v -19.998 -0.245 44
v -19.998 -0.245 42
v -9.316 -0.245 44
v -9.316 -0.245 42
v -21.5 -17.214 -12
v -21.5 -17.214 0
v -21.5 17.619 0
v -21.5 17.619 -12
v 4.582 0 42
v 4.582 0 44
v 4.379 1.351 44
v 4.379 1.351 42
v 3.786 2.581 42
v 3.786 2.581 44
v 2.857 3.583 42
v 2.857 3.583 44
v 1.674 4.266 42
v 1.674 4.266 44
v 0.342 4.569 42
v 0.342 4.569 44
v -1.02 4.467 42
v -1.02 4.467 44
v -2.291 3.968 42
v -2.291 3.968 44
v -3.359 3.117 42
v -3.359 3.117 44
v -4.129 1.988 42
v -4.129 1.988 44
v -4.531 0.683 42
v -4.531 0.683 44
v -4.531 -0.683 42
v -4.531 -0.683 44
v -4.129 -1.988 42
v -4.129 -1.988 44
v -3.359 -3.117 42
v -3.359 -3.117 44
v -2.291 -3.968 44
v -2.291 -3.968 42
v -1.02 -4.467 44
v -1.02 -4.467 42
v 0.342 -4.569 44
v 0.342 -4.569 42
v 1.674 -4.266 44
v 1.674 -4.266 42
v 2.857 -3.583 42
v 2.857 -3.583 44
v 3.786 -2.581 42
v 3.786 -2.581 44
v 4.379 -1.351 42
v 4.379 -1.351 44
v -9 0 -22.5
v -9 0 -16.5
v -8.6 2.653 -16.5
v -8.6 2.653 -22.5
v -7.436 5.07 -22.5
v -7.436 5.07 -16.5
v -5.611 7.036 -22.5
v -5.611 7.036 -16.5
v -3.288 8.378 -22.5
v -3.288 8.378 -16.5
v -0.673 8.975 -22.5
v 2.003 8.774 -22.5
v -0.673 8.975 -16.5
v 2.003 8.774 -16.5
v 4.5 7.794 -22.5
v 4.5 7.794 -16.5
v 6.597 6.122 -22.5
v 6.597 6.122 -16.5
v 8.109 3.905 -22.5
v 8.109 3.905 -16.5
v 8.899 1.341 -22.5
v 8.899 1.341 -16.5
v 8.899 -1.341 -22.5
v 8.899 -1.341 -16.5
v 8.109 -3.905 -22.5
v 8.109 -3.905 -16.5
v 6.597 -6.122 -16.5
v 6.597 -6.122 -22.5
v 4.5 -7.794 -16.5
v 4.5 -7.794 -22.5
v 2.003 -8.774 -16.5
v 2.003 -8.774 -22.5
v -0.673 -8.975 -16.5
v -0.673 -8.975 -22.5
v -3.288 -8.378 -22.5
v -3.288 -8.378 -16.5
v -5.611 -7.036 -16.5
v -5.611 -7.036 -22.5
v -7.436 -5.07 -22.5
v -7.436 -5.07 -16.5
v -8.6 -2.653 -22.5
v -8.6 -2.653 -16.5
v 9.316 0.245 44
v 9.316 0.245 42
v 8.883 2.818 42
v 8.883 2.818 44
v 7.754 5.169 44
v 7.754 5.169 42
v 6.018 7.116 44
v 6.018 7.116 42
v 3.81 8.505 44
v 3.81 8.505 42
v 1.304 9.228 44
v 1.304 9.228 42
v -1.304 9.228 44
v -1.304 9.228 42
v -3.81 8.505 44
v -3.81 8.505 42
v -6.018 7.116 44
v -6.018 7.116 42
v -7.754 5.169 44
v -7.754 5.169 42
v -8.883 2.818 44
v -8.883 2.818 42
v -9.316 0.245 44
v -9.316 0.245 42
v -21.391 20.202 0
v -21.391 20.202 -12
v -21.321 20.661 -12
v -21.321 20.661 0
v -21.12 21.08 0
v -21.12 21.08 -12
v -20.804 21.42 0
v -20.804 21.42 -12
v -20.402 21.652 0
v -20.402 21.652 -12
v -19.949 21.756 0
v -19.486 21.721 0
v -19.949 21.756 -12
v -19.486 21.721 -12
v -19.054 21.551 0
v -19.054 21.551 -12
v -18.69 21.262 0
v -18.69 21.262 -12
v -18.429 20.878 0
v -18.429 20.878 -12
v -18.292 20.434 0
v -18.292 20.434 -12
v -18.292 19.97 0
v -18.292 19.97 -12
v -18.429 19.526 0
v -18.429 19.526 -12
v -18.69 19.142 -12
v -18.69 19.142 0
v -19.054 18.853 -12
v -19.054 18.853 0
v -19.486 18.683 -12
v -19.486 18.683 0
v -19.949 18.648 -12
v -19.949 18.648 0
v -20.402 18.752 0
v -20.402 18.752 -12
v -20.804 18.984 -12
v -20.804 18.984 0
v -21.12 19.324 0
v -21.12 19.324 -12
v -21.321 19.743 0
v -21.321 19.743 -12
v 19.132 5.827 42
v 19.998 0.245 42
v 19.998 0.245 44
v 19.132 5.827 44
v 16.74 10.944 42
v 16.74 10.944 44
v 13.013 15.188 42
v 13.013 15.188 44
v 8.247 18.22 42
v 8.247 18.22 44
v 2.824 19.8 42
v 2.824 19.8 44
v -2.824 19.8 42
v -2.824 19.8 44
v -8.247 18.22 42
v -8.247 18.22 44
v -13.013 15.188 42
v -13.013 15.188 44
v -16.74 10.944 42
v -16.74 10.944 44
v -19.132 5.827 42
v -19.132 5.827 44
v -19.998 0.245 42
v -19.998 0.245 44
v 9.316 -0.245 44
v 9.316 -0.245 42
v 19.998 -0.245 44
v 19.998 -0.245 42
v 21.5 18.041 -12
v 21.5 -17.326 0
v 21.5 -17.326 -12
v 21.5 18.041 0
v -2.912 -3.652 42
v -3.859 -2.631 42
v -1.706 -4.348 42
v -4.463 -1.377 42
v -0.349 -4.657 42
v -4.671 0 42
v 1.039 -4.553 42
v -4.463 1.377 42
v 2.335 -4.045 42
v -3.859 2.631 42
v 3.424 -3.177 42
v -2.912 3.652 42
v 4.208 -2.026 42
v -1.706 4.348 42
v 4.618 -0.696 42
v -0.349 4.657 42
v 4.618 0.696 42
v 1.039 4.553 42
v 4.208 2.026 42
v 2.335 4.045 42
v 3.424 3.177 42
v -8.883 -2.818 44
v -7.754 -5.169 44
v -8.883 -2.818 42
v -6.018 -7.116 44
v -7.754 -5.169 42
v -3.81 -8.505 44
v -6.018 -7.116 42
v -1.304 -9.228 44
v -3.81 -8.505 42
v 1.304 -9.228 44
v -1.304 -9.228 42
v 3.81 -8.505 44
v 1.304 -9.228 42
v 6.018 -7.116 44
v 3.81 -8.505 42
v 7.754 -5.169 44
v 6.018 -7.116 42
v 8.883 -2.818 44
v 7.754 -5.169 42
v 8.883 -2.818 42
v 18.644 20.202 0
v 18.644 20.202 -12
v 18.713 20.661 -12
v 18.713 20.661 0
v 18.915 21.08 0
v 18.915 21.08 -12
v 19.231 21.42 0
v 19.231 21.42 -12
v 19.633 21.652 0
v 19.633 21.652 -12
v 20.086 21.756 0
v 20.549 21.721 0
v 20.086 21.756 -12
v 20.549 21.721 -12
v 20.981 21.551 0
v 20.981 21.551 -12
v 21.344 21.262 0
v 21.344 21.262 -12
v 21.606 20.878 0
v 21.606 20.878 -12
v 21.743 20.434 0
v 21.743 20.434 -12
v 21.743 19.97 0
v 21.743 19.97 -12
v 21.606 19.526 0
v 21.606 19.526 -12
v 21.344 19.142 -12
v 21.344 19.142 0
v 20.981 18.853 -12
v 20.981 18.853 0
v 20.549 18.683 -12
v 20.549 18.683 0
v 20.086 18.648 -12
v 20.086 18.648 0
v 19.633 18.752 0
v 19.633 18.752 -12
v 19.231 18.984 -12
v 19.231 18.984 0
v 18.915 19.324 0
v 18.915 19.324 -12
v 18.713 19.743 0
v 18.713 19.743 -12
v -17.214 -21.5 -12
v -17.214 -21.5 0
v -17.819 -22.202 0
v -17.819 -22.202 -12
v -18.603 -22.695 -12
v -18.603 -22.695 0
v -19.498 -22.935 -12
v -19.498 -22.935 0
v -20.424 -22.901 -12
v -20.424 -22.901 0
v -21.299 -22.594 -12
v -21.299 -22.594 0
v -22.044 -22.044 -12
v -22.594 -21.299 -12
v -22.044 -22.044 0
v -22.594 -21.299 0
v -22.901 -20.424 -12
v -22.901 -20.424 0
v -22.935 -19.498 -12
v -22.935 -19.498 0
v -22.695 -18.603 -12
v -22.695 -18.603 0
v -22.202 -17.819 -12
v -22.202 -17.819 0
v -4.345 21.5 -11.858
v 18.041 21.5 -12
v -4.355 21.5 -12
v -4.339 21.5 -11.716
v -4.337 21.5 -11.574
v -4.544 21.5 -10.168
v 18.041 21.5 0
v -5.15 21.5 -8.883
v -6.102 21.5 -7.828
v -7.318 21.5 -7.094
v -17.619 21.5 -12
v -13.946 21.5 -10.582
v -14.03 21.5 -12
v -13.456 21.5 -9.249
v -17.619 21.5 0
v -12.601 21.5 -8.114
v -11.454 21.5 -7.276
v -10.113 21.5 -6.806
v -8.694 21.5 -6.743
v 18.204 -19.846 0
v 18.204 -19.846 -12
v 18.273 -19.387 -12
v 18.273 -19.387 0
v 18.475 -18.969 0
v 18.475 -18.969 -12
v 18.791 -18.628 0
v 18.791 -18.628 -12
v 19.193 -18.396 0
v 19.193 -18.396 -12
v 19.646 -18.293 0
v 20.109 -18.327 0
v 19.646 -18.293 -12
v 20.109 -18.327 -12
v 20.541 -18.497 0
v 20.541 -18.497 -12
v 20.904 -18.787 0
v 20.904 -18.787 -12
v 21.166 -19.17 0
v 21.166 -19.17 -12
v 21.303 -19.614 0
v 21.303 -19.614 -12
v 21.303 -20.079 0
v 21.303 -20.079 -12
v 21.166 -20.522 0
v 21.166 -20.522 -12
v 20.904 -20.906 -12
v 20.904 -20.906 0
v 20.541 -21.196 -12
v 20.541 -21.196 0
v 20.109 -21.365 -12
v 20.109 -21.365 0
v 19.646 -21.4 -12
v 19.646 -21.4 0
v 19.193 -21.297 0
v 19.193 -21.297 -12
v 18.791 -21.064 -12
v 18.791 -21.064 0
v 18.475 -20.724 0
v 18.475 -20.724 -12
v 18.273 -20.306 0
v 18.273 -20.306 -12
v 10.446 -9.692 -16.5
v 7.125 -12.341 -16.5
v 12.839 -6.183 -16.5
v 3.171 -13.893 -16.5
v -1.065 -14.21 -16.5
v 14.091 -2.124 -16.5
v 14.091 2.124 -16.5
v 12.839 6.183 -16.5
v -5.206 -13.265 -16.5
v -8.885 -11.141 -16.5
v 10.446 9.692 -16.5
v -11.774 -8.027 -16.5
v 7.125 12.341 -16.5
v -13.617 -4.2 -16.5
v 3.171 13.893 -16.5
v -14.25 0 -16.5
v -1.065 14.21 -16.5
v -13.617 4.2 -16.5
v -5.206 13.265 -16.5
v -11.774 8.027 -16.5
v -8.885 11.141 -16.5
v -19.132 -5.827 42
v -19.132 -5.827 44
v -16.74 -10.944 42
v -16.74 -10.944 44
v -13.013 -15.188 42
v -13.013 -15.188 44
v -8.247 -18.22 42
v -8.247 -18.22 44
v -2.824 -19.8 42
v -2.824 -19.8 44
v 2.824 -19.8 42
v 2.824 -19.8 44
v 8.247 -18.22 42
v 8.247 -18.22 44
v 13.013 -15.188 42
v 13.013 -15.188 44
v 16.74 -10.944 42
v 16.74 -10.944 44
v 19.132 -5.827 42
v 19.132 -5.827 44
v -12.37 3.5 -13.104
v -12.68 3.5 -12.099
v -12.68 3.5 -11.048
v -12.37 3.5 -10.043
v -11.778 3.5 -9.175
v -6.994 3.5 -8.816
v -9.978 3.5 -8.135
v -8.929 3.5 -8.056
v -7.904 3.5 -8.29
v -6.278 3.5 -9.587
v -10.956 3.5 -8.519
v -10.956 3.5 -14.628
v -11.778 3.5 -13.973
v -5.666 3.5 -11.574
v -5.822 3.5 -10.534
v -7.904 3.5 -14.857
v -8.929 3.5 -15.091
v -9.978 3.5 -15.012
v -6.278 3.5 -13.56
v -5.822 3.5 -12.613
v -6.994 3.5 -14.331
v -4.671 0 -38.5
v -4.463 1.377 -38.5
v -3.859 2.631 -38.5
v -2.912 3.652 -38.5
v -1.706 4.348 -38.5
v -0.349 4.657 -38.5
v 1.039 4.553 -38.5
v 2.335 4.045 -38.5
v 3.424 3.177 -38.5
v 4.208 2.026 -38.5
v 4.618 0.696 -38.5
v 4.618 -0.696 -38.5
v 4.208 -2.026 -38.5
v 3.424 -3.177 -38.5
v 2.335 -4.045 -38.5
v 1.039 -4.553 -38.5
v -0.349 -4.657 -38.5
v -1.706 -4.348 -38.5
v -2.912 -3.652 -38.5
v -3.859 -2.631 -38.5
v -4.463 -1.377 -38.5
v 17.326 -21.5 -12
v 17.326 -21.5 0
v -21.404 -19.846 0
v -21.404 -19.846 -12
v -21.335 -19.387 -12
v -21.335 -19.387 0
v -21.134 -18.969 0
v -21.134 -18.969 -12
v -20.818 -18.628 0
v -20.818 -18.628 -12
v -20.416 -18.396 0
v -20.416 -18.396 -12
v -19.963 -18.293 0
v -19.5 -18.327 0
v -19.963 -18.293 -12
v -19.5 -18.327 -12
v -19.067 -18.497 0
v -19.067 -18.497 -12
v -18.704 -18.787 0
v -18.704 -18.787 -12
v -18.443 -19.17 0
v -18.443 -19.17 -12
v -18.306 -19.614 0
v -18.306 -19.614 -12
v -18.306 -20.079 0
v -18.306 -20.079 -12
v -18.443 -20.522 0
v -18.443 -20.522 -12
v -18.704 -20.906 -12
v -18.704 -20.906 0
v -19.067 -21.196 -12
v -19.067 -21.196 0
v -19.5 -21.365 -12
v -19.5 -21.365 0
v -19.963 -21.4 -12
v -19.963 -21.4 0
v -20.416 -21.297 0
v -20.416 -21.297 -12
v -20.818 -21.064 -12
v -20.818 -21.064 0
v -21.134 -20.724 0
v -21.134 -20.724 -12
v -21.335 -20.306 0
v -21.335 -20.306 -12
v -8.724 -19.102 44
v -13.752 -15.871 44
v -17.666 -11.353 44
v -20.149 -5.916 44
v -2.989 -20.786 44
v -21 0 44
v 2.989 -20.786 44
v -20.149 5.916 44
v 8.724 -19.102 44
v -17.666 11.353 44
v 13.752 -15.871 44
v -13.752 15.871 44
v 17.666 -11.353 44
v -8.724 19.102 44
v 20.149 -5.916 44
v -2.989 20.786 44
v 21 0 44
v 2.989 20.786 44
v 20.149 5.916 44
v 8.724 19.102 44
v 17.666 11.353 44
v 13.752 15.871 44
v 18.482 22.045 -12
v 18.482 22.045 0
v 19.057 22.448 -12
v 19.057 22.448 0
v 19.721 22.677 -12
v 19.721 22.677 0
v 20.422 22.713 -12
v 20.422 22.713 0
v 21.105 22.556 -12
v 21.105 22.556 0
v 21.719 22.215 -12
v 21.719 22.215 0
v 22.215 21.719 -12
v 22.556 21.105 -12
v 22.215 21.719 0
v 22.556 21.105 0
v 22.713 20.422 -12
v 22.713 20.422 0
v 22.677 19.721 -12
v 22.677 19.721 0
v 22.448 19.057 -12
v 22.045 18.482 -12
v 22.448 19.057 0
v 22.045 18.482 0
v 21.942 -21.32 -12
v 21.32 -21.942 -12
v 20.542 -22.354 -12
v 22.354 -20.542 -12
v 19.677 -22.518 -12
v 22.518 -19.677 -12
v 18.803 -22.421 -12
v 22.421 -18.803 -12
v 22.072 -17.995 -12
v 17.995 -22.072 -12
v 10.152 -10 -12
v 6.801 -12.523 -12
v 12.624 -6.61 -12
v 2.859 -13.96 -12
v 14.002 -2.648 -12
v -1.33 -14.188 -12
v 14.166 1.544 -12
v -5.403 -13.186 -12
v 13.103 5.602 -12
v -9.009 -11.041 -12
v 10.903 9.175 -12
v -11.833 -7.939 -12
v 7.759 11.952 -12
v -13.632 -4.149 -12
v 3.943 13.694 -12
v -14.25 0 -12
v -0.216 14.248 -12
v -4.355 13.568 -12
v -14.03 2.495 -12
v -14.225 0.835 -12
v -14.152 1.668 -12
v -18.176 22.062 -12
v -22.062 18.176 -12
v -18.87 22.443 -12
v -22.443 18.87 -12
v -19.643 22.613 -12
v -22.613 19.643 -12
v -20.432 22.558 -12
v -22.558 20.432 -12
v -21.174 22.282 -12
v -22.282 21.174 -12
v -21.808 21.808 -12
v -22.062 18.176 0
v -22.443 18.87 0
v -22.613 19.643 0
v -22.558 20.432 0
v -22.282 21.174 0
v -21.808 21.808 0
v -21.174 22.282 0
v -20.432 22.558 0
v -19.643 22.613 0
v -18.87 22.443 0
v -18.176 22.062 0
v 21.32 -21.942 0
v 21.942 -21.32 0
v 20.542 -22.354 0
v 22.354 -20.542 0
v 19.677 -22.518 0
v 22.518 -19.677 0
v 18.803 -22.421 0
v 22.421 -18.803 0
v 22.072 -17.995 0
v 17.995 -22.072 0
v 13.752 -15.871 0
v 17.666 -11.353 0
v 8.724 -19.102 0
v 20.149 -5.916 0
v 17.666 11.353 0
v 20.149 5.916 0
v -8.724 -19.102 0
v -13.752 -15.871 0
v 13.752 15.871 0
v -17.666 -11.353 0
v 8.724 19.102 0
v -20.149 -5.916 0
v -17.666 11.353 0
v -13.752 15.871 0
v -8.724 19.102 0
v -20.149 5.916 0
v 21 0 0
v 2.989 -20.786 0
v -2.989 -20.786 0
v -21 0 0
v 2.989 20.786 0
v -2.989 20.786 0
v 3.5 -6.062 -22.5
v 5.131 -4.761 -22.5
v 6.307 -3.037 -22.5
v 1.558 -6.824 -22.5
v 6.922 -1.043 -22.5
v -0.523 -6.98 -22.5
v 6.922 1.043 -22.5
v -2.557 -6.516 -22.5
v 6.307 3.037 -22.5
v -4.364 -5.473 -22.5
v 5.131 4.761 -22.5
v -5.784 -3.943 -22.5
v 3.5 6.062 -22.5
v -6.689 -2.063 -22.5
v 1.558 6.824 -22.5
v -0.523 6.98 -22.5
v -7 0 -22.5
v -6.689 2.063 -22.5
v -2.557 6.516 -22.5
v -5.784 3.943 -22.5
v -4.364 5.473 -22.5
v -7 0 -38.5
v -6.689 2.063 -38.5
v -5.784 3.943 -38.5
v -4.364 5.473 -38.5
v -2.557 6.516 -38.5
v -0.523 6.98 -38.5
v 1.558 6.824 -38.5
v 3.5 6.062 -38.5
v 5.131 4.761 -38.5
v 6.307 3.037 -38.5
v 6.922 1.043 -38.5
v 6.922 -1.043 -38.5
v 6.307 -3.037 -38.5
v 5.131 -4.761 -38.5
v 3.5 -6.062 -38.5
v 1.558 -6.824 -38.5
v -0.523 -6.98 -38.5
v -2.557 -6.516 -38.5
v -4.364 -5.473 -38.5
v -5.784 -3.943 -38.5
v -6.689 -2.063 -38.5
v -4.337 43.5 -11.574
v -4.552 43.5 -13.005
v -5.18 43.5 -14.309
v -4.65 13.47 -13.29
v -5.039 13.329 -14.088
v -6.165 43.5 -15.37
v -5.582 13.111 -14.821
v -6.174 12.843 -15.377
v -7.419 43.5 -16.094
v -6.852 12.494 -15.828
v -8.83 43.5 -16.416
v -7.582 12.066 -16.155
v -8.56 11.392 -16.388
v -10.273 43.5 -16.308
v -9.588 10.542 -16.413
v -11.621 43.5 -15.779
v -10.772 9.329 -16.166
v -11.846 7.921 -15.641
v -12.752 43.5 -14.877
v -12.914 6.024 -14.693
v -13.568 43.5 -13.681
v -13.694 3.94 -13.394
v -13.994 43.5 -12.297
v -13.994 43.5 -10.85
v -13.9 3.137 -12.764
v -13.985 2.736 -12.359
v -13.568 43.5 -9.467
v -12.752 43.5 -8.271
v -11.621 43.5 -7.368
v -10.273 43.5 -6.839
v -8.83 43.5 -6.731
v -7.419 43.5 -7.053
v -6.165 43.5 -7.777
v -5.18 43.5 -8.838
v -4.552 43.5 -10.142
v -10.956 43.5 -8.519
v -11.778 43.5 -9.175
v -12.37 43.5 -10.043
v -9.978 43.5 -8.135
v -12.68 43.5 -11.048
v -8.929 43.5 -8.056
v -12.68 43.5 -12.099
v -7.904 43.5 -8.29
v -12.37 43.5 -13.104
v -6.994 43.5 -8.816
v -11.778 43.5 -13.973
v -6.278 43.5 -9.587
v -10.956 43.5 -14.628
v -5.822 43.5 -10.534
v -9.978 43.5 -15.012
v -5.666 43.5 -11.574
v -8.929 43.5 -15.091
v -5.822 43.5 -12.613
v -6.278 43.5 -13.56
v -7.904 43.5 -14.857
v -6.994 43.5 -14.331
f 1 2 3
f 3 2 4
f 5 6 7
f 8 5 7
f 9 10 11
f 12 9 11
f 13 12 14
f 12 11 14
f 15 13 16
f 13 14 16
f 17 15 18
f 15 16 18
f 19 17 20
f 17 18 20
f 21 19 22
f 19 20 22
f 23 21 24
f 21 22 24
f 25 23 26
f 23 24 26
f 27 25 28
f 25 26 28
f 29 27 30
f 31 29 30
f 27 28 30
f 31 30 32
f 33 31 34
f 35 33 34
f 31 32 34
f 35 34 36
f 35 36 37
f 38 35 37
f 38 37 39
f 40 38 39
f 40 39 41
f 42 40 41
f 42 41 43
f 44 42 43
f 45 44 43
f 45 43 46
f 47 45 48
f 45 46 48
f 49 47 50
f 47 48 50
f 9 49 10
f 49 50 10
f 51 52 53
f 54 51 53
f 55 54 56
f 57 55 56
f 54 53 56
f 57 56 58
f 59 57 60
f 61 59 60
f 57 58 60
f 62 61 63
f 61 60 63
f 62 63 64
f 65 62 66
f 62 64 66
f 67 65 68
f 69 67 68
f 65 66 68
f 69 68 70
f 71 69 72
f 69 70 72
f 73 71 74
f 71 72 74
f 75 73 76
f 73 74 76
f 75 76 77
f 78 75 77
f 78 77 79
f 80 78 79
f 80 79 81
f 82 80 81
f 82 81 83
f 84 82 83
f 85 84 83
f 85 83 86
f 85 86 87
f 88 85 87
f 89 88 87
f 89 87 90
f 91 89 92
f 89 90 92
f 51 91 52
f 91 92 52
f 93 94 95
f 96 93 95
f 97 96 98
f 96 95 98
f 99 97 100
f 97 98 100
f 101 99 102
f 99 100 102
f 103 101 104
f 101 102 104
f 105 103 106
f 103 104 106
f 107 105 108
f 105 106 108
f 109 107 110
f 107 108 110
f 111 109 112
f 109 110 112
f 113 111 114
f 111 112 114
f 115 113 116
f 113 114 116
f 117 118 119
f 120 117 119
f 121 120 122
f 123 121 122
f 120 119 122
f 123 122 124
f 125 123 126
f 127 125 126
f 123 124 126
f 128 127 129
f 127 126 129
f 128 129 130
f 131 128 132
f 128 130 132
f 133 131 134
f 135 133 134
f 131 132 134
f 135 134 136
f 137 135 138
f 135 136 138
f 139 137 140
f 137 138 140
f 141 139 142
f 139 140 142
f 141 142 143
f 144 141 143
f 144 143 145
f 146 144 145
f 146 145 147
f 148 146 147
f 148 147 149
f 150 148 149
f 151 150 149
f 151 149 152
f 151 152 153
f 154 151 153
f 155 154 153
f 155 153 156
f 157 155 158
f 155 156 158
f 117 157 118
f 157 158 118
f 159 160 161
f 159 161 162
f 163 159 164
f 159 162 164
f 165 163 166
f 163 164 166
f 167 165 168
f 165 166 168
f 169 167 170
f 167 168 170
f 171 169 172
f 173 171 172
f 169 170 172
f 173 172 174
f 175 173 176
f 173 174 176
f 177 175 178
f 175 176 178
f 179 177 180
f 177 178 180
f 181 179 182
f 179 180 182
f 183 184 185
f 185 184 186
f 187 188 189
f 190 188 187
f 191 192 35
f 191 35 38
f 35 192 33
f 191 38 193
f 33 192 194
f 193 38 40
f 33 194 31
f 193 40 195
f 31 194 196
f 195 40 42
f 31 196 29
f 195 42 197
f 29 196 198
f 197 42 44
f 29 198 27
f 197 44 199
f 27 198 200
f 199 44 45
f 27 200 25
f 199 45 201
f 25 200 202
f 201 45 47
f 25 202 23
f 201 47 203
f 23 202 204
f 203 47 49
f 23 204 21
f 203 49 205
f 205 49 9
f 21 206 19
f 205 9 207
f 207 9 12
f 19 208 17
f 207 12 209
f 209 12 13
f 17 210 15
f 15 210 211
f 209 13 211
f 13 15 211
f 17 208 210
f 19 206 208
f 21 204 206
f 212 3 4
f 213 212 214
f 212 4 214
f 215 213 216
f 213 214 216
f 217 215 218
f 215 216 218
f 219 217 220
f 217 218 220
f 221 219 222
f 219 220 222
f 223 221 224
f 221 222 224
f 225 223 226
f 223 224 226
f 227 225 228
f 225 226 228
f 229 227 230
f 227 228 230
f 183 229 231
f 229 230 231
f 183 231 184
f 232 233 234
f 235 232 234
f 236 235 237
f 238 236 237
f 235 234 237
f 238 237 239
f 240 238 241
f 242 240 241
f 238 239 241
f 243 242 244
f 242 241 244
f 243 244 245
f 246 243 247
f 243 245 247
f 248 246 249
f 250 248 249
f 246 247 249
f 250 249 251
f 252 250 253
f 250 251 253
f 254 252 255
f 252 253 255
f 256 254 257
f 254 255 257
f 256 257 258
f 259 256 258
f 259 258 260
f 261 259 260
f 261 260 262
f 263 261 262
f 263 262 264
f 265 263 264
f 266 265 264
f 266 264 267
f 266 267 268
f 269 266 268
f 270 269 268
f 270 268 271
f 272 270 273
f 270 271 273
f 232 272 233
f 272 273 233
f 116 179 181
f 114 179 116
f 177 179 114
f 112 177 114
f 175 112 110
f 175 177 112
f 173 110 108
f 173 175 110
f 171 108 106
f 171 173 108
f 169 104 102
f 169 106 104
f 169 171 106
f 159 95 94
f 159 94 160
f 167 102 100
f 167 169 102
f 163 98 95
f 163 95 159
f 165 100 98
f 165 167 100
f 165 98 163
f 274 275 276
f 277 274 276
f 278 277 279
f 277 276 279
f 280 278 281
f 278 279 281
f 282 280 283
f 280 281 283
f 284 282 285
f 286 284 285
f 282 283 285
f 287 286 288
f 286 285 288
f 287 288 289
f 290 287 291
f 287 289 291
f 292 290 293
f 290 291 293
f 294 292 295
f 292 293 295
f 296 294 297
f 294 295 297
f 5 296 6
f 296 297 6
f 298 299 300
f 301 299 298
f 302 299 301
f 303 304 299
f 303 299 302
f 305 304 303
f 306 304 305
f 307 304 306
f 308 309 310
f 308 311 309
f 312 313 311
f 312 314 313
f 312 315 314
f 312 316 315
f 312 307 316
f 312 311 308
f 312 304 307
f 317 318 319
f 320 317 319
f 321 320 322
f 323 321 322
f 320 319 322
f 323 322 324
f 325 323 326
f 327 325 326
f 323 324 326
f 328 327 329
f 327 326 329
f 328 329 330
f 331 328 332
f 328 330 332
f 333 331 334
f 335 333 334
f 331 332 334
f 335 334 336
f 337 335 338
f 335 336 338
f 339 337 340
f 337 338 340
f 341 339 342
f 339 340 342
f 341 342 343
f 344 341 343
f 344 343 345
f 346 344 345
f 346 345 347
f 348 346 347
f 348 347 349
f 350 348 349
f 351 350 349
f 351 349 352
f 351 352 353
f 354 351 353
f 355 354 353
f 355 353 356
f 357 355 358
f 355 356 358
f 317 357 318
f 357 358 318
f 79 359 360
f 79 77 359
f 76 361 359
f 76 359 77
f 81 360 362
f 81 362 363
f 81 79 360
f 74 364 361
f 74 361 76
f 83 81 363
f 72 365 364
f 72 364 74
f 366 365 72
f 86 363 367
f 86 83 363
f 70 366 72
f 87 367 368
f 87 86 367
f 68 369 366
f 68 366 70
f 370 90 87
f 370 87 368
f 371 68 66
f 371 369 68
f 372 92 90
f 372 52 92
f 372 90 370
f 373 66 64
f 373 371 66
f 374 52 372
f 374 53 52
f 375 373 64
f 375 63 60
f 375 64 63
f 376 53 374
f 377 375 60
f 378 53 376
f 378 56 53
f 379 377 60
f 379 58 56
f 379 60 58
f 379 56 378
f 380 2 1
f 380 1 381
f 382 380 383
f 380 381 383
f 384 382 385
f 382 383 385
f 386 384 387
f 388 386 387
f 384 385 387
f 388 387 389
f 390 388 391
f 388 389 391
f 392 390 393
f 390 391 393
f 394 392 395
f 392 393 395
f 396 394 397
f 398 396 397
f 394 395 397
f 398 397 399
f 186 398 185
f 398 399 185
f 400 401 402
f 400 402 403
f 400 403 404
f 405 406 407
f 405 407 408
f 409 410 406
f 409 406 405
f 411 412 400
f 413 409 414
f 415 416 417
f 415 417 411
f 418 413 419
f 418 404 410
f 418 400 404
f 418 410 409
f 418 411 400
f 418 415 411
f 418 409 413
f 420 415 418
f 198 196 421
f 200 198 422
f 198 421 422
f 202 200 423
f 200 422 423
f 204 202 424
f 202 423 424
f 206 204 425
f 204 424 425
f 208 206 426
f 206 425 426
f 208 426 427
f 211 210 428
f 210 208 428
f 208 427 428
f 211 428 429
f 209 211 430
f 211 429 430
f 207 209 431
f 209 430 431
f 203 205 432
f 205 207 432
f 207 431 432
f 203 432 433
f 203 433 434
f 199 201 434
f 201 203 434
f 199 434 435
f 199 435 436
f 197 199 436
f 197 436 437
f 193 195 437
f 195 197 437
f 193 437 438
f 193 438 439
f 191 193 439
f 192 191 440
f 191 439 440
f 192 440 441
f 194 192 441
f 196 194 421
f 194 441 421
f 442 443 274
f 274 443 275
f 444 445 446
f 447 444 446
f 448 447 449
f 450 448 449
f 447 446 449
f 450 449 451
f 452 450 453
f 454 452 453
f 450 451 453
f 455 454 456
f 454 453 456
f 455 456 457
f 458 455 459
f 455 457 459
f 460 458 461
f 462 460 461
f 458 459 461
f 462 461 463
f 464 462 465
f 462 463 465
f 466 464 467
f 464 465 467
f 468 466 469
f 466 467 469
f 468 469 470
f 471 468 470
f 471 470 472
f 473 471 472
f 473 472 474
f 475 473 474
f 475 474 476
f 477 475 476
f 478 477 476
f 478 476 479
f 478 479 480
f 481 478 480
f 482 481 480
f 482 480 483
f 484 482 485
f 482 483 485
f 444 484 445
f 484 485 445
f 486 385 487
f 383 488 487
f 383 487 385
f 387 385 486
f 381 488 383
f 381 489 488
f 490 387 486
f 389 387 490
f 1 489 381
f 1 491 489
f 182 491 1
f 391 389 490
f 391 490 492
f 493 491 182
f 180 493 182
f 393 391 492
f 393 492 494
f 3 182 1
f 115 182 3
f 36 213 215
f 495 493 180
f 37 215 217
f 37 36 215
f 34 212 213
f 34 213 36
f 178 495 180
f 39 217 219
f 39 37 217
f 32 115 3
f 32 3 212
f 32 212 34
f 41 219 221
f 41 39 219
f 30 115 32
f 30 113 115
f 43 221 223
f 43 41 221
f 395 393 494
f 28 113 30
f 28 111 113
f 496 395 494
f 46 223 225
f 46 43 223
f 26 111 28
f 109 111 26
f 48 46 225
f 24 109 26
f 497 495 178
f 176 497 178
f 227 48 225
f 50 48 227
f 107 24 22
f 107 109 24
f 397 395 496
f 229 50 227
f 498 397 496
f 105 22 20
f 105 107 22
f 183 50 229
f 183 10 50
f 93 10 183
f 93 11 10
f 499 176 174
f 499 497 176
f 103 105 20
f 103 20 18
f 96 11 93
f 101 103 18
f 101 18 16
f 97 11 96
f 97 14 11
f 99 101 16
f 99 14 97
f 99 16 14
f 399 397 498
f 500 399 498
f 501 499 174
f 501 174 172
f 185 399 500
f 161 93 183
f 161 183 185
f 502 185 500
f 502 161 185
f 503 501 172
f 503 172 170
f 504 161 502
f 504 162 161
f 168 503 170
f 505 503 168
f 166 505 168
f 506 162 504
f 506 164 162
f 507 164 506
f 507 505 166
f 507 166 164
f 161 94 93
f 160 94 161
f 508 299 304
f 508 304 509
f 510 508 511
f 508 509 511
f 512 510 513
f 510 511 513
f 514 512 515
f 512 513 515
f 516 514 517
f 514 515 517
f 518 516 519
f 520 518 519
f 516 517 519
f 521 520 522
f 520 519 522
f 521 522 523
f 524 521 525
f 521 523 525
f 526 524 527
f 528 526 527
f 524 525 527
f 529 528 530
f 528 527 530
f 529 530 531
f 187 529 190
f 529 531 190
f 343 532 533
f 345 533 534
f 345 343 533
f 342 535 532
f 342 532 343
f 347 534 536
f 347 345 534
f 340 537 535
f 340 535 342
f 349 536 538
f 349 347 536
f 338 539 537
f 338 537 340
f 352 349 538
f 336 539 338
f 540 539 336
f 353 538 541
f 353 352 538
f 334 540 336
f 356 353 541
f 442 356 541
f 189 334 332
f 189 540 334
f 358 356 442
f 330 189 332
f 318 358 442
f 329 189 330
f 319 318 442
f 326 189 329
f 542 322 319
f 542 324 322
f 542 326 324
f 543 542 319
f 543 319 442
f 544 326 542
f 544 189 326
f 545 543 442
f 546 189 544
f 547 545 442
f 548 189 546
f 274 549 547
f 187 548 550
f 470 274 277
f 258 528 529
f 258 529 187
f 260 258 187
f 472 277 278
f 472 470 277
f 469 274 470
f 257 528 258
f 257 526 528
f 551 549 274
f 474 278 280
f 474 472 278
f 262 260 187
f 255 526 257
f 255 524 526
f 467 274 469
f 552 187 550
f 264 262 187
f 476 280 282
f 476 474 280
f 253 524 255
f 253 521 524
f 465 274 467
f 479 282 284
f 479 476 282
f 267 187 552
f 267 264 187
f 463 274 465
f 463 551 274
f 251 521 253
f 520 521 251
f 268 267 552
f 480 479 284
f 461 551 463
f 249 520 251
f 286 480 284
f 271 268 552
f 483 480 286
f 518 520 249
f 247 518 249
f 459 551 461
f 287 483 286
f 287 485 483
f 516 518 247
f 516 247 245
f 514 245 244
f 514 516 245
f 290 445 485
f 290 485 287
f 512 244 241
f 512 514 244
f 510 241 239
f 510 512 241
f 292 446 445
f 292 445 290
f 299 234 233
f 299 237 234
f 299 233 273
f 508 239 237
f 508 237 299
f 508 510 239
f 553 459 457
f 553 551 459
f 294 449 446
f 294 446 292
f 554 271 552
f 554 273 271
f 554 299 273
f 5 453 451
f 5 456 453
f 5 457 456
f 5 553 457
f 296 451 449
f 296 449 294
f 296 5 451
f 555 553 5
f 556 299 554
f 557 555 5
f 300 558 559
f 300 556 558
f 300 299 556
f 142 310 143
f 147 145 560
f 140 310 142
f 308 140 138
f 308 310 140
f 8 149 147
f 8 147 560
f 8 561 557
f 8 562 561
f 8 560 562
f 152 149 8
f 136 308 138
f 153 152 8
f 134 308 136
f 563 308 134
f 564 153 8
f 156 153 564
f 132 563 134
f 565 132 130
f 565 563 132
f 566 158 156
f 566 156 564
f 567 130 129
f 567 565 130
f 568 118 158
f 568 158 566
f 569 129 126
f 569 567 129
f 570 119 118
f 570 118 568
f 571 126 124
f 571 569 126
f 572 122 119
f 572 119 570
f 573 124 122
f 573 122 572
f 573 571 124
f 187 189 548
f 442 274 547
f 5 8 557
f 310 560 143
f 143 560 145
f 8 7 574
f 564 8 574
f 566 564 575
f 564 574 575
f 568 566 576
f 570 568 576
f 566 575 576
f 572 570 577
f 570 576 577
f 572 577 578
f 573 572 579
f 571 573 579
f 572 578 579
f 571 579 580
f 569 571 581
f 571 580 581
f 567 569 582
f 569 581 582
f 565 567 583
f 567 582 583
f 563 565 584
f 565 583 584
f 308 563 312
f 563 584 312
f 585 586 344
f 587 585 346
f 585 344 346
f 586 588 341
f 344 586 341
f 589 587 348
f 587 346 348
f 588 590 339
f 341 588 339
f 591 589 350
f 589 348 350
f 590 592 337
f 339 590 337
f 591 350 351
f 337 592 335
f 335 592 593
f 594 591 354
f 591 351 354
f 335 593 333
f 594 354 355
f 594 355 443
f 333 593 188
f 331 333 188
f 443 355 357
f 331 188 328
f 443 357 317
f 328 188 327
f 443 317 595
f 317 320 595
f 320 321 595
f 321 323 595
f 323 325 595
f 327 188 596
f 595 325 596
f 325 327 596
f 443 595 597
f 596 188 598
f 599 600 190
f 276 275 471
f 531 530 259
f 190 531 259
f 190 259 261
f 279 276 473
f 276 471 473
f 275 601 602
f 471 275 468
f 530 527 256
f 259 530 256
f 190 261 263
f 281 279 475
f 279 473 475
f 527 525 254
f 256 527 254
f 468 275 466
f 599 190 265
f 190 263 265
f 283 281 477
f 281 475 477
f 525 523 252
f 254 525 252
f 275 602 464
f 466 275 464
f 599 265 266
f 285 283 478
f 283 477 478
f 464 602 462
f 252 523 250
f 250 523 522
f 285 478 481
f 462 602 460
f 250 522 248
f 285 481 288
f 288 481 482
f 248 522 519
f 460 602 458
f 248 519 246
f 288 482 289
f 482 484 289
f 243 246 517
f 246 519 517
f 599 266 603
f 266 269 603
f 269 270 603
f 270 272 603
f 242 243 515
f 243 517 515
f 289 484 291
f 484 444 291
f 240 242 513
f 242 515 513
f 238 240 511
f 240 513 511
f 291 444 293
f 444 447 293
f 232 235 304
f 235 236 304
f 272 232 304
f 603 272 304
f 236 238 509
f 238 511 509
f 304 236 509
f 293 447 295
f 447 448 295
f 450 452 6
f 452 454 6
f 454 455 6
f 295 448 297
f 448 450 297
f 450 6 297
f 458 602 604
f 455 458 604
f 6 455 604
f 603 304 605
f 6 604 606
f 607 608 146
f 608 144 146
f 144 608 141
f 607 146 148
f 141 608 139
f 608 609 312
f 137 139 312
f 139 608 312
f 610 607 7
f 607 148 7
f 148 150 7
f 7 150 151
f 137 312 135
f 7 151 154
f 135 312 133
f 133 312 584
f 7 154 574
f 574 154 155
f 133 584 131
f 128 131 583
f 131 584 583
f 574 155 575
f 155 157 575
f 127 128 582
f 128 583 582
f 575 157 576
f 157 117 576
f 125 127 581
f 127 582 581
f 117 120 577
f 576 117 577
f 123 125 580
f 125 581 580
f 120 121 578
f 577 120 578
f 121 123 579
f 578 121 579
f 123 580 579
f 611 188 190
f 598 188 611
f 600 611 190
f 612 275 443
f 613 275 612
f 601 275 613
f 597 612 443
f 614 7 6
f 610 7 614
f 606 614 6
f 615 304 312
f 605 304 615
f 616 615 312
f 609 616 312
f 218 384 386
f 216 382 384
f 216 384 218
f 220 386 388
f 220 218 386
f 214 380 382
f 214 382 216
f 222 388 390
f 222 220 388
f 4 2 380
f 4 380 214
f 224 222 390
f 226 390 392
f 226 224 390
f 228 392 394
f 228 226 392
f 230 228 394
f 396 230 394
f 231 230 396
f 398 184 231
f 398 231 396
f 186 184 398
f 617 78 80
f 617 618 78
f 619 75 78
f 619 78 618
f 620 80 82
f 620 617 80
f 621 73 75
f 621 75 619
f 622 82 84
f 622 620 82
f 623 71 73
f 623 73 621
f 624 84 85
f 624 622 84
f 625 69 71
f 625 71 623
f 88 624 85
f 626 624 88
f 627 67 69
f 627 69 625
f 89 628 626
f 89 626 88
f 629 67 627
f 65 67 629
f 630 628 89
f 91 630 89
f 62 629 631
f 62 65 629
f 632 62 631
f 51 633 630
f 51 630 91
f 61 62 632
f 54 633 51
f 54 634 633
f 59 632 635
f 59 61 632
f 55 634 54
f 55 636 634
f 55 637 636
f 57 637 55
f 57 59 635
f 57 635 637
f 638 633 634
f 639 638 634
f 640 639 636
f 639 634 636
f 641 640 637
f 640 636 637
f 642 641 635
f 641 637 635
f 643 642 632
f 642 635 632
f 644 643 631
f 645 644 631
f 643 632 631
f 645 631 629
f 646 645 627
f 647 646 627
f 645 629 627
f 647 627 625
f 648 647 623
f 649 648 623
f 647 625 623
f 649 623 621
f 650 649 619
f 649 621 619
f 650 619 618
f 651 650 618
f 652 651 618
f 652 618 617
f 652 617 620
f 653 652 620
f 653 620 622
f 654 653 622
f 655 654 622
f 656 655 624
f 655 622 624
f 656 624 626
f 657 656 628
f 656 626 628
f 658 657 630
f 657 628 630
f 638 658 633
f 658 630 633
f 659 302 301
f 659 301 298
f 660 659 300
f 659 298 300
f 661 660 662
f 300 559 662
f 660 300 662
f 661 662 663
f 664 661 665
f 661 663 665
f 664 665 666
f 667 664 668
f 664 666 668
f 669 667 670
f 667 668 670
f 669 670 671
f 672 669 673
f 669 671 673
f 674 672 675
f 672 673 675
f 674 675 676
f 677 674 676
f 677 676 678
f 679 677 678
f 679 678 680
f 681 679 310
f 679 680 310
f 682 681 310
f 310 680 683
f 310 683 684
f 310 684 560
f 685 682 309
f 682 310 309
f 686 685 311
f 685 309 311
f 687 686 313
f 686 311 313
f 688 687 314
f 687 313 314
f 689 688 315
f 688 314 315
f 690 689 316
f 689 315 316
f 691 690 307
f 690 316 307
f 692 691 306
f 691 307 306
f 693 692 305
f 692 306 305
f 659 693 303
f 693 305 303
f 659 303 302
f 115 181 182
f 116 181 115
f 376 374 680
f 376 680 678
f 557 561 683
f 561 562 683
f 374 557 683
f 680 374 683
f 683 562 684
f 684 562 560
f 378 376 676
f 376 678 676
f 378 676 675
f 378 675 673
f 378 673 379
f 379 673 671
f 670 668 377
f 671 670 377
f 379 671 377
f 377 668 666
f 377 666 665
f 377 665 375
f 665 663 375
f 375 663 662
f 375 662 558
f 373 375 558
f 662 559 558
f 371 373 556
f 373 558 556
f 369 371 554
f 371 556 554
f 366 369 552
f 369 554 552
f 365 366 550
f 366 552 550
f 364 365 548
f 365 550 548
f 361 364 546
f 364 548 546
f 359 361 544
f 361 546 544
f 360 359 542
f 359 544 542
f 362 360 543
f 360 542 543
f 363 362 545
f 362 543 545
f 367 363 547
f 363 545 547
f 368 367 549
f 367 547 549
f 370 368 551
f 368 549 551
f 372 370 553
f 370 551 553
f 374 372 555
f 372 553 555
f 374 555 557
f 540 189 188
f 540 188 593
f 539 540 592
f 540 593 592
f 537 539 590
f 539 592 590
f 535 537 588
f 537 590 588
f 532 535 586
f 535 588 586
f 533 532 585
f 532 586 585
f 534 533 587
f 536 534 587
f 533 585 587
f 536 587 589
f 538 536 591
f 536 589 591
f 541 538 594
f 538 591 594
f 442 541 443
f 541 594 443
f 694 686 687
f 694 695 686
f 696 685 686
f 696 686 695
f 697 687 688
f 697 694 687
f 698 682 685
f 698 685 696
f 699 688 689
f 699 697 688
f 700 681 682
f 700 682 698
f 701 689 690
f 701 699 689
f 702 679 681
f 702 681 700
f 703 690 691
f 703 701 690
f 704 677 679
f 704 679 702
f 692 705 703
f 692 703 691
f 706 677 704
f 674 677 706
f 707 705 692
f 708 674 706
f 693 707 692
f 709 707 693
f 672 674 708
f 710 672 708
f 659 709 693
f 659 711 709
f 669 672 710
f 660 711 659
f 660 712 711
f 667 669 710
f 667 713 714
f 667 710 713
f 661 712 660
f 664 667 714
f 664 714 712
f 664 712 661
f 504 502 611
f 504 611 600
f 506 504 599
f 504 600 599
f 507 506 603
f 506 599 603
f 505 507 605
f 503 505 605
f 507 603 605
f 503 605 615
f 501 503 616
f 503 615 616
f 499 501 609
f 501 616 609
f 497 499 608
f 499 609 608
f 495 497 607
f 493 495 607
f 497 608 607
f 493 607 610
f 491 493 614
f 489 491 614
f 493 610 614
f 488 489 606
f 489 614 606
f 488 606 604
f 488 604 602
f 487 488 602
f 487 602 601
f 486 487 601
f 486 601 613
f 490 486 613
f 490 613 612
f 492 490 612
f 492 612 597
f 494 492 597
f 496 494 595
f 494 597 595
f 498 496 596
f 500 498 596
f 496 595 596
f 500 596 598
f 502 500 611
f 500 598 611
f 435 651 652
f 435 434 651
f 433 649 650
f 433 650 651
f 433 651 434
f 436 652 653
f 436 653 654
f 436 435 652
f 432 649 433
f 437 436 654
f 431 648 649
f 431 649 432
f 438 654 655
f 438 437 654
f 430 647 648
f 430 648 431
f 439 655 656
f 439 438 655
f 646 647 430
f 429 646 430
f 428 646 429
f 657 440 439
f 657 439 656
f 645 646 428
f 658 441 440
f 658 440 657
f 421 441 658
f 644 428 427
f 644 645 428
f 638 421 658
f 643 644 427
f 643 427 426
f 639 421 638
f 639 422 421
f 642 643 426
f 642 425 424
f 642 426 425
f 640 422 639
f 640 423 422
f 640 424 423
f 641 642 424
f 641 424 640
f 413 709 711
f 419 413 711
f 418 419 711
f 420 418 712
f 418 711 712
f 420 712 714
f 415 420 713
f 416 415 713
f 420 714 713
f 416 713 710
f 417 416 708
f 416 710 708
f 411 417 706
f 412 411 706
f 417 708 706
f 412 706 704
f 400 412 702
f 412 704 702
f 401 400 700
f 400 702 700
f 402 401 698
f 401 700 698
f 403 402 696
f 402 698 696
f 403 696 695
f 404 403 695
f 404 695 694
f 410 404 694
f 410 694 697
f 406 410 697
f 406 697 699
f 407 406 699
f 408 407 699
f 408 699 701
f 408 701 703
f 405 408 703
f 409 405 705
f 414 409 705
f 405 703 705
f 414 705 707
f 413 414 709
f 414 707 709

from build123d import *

# Parameters (mm, degrees)
SKETCH2_R                 = 21
BOSS_EXTRUDE4_DEPTH       = 44
SKETCH6_R                 = 2.52099285
SKETCH6_R_2               = 2.774223213
SKETCH6_R_3               = 2.958692603
SKETCH6_R_4               = 3.108326591
SKETCH6_W                 = 43
SKETCH6_H                 = 43
BOSS_EXTRUDE8_DEPTH       = 12
SKETCH7_R                 = 1.557999949
CUT_EXTRUDE1_DEPTH        = 12
SKETCH9_R                 = 14.25
BOSS_EXTRUDE10_DEPTH      = 4.5
SKETCH10_R                = 4.856031572
BOSS_EXTRUDE12_DEPTH      = 22
BOSS_EXTRUDE12_DEPTH_BACK = 22
SKETCH11_R                = 9
BOSS_EXTRUDE13_DEPTH      = 6
SKETCH12_R                = 7
BOSS_EXTRUDE14_DEPTH      = 16
SKETCH13_R                = 4.670506922
CUT_EXTRUDE3_DEPTH        = 120
SKETCH15_R                = 3.527063208
CUT_EXTRUDE5_DEPTH        = 40
SKETCH16_R                = 20
CUT_EXTRUDE6_DEPTH        = 2
SKETCH17_W                = 40.997064224
SKETCH17_H                = 0.490637438
BOSS_EXTRUDE15_DEPTH      = 2
SKETCH18_R                = 9.319375459
BOSS_EXTRUDE16_DEPTH      = 2
SKETCH19_R                = 4.582310756
CUT_EXTRUDE7_DEPTH        = 2


with BuildPart() as part:
    # Sketch2 → Boss-Extrude4 (new body)
    with BuildSketch(Plane.XY):
        Circle(SKETCH2_R)
    extrude(amount=BOSS_EXTRUDE4_DEPTH)

    # Sketch6 → Boss-Extrude8 (add)
    with BuildSketch(Plane(origin=(0, 0, 0), x_dir=(-1, 0, 0), z_dir=(0, 0, -1))):
        with Locations((-20.202035706, 20.202035706)):
            Circle(SKETCH6_R)
        with Locations((19.846366063, 19.846366063)):
            Circle(SKETCH6_R_2)
        with Locations((-19.561830349, -19.561830349)):
            Circle(SKETCH6_R_3)
        with Locations((19.846366063, -19.846366063)):
            Circle(SKETCH6_R_4)
        Rectangle(SKETCH6_W, SKETCH6_H)
    extrude(amount=BOSS_EXTRUDE8_DEPTH)

    # Sketch7 → Cut-Extrude1 (cut)
    with BuildSketch(Plane(origin=(0, 0, -12), x_dir=(-1, 0, 0), z_dir=(0, 0, -1))):
        with Locations((-20.202035706, 20.202035706)):
            Circle(SKETCH7_R)
        with Locations((19.832590029, 20.202035706)):
            Circle(SKETCH7_R)
        with Locations((19.846366063, -19.846366063)):
            Circle(SKETCH7_R)
        with Locations((-19.76209834, -19.846366063)):
            Circle(SKETCH7_R)
    extrude(amount=-CUT_EXTRUDE1_DEPTH, mode=Mode.SUBTRACT)

    # Sketch9 → Boss-Extrude10 (add)
    with BuildSketch(Plane(origin=(0, 0, -12), x_dir=(-1, 0, 0), z_dir=(0, 0, -1))):
        Circle(SKETCH9_R)
    extrude(amount=BOSS_EXTRUDE10_DEPTH)

    # Sketch10 → Boss-Extrude12 (add, two sides)
    with BuildSketch(Plane(origin=(0, 21.5, 0), x_dir=(1, 0, 0), z_dir=(0, 1, 0))) as boss_extrude12_sk:
        with Locations((-9.192655729, 11.573586892)):
            Circle(SKETCH10_R)
    extrude(amount=BOSS_EXTRUDE12_DEPTH)
    extrude(boss_extrude12_sk.sketch, amount=-BOSS_EXTRUDE12_DEPTH_BACK)

    # Sketch11 → Boss-Extrude13 (add)
    with BuildSketch(Plane(origin=(0, 0, -16.5), x_dir=(-1, 0, 0), z_dir=(0, 0, -1))):
        Circle(SKETCH11_R)
    extrude(amount=BOSS_EXTRUDE13_DEPTH)

    # Sketch12 → Boss-Extrude14 (add)
    with BuildSketch(Plane(origin=(0, 0, -22.5), x_dir=(-1, 0, 0), z_dir=(0, 0, -1))):
        Circle(SKETCH12_R)
    extrude(amount=BOSS_EXTRUDE14_DEPTH)

    # Sketch13 → Cut-Extrude3 (cut)
    with BuildSketch(Plane(origin=(0, 0, -38.5), x_dir=(-1, 0, 0), z_dir=(0, 0, -1))):
        Circle(SKETCH13_R)
    extrude(amount=-CUT_EXTRUDE3_DEPTH, mode=Mode.SUBTRACT)

    # Sketch15 → Cut-Extrude5 (cut)
    with BuildSketch(Plane(origin=(0, 43.5, 0), x_dir=(1, 0, 0), z_dir=(0, 1, 0))):
        with Locations((-9.192655729, 11.573586892)):
            Circle(SKETCH15_R)
    extrude(amount=-CUT_EXTRUDE5_DEPTH, mode=Mode.SUBTRACT)

    # Sketch16 → Cut-Extrude6 (cut)
    with BuildSketch(Plane.XY.offset(44)):
        Circle(SKETCH16_R)
    extrude(amount=-CUT_EXTRUDE6_DEPTH, mode=Mode.SUBTRACT)

    # Sketch17 → Boss-Extrude15 (add)
    with BuildSketch(Plane.XY.offset(42)):
        Rectangle(SKETCH17_W, SKETCH17_H)
    extrude(amount=BOSS_EXTRUDE15_DEPTH)

    # Sketch18 → Boss-Extrude16 (add)
    with BuildSketch(Plane.XY.offset(42)):
        Circle(SKETCH18_R)
    extrude(amount=BOSS_EXTRUDE16_DEPTH)

    # Sketch19 → Cut-Extrude7 (cut)
    with BuildSketch(Plane.XY.offset(44)):
        Circle(SKETCH19_R)
    extrude(amount=-CUT_EXTRUDE7_DEPTH, mode=Mode.SUBTRACT)


solid = part.part
